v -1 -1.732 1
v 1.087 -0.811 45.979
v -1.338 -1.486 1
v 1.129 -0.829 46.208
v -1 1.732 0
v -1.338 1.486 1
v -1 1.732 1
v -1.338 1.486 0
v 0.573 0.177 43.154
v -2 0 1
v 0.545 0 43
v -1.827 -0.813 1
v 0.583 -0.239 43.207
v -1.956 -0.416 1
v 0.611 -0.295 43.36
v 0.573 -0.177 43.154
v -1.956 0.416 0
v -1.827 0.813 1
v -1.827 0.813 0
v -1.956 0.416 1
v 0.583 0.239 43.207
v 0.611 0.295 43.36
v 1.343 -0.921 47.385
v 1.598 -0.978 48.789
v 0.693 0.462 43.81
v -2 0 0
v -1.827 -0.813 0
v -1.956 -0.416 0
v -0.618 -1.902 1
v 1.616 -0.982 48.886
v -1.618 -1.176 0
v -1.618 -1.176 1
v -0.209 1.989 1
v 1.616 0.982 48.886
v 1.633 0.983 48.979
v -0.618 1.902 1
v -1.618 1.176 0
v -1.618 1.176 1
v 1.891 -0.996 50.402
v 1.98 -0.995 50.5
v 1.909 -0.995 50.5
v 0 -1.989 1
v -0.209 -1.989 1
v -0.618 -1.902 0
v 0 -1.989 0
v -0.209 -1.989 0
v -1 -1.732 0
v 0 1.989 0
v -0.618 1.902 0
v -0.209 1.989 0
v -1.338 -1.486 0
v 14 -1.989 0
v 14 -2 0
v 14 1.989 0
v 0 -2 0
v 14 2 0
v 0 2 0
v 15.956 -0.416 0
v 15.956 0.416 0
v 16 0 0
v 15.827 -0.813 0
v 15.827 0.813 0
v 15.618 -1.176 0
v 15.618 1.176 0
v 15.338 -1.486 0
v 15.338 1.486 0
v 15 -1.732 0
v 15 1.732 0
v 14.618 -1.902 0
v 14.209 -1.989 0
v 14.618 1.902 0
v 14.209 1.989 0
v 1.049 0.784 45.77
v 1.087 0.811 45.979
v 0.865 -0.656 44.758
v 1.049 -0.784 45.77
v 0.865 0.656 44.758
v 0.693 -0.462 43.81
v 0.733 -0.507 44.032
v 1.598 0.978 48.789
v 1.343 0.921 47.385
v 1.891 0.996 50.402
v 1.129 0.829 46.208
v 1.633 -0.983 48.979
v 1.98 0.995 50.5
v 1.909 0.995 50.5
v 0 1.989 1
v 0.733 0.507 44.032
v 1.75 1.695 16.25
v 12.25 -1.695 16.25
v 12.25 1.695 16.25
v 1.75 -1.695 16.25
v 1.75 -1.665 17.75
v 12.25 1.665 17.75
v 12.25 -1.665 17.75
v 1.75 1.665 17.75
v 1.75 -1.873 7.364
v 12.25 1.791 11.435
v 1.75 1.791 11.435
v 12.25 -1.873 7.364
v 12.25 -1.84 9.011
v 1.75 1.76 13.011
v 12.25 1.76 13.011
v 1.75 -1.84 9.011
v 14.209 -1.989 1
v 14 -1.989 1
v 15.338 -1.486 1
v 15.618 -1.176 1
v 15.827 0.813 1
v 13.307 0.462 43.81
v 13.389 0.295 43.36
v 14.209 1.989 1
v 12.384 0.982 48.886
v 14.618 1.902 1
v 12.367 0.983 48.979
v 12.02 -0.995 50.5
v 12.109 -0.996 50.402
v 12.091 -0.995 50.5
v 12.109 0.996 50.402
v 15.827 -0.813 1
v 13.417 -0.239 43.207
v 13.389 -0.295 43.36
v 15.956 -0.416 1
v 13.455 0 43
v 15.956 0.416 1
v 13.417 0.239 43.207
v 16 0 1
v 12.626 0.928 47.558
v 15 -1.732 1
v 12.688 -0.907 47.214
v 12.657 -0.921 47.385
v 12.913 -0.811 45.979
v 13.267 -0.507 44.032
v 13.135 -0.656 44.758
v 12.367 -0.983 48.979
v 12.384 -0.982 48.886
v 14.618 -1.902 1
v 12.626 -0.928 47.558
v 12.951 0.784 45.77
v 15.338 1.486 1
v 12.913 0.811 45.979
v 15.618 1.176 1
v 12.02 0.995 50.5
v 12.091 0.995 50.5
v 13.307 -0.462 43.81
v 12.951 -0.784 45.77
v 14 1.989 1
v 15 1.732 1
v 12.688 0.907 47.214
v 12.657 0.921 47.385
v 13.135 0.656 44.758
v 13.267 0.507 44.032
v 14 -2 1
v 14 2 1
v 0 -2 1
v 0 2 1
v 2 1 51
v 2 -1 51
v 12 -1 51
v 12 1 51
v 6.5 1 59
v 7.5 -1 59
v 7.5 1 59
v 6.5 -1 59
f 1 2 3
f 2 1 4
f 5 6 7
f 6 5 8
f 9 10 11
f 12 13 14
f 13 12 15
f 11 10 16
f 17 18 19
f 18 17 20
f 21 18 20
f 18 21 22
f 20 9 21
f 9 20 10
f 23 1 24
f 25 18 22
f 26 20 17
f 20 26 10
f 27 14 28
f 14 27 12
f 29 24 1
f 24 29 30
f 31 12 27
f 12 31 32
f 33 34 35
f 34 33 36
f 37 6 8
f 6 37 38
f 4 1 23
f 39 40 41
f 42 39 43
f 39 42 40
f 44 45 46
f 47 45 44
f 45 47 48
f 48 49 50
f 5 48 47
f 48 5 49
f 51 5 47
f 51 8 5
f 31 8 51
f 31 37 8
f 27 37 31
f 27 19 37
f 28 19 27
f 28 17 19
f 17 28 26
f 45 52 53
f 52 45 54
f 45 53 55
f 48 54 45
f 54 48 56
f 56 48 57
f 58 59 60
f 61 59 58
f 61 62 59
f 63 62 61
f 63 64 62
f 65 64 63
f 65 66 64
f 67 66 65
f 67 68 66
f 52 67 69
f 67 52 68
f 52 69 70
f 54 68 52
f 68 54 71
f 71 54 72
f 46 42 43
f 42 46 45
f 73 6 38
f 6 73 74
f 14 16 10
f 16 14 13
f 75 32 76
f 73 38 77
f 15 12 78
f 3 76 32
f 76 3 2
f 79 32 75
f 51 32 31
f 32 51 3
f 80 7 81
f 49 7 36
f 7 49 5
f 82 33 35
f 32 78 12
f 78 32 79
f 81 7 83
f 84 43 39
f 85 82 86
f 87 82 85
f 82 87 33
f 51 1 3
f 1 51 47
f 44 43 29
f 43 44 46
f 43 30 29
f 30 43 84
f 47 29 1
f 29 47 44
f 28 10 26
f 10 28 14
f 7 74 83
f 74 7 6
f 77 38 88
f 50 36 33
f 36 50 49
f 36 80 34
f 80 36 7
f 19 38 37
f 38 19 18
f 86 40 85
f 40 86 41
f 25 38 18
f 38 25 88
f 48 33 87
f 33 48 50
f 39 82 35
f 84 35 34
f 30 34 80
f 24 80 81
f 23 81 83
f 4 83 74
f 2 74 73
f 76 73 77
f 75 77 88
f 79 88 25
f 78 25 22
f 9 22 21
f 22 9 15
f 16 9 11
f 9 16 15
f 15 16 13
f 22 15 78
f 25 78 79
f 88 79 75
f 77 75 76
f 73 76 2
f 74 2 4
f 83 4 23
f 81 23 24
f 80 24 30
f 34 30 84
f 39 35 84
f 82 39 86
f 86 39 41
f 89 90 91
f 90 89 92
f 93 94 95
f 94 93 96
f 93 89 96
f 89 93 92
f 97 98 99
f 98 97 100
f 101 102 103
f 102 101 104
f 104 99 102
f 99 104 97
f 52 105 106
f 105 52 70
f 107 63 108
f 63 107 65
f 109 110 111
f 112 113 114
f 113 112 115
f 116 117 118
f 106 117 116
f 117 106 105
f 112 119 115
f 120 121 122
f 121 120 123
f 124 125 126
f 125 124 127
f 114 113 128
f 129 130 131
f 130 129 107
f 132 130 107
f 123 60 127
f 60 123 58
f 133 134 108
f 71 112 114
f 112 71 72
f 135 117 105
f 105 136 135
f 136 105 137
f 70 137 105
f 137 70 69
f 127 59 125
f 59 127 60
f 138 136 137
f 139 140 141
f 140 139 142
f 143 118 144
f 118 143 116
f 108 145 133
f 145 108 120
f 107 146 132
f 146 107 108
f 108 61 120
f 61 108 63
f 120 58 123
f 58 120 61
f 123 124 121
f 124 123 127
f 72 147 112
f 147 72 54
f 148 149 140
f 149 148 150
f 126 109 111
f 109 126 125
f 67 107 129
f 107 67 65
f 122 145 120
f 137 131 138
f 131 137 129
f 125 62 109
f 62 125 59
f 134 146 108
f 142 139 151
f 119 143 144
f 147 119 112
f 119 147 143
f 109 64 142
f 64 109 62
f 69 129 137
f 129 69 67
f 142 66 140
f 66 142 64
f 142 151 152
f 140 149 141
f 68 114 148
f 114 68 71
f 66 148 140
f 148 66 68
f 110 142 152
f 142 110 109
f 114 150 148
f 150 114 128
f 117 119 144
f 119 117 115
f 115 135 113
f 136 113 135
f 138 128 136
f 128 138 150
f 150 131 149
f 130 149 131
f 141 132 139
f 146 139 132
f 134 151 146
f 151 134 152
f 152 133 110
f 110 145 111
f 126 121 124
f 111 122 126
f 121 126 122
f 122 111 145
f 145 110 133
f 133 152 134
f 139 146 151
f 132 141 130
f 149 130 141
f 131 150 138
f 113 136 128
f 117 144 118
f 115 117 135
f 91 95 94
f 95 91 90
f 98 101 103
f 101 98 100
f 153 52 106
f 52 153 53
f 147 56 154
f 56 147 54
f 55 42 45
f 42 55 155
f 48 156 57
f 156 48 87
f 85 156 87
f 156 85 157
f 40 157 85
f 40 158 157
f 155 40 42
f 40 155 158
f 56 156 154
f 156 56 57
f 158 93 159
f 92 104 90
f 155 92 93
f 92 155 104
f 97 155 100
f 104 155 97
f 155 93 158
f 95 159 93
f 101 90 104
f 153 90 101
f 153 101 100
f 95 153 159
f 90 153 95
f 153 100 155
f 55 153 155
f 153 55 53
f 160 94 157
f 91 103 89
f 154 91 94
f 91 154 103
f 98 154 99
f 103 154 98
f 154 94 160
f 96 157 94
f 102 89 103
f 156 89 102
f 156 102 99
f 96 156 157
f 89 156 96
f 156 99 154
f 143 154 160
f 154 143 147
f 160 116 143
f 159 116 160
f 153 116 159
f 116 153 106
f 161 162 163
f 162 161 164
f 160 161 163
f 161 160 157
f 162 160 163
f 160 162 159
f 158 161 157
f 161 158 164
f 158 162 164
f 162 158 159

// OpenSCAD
// band width[mm]
nauhanleveys = 10; // [1:1:50]
// band thickness[mm] 
nauhanpaksuus = 1; // [0.2:0.1:5]

module takareika(){
hull(){
translate([1.25+nauhanleveys/20,-5,4])  
cube([nauhanleveys+0.5,0.1,nauhanpaksuus+0.5,]);
translate([1.25+nauhanleveys/20,4,14])  
cube([nauhanleveys+0.5,0.1,nauhanpaksuus+0.5,]);
}}

module etureika(){
hull(){
translate([1.25+nauhanleveys/20,-5,12.75+nauhanpaksuus+nauhanleveys/4])  
cube([nauhanleveys+0.5,1,nauhanpaksuus+0.5]);
translate([1.25+nauhanleveys/20,4,12.75+nauhanpaksuus+nauhanleveys/4])  
cube([nauhanleveys+0.5,1,nauhanpaksuus+0.5]);
}}


$fn = 30;

difference(){
hull(){  // vasen reuna
translate([0,0,0.5])
cylinder(h=1, r=1.5+nauhanleveys/20, center=true);
translate([1.5+nauhanleveys/20,0,50])
cylinder(h=1, r=0.5+nauhanleveys/20, center=true);
}
// viiste
hull(){
translate([0,-5,51])
cube([1.5+nauhanleveys/20,10,1]);
translate([-10,-5,40])
cube([10,10,1]);
}
etureika();
takareika();
}

difference(){
hull(){ // oikea reuna
translate([nauhanleveys+3+nauhanleveys/10,0,0.5])
cylinder(h=1, r=1.5+nauhanleveys/20, center=true);
translate([nauhanleveys+1.5+nauhanleveys/20,0,50])
cylinder(h=1, r=0.5+nauhanleveys/20, center=true);
}
//viiste
hull(){
translate([1.5+nauhanleveys+nauhanleveys/20,-5,51])
cube([10,10,1]);
translate([3+nauhanleveys+nauhanleveys/10,-5,40])
cube([10,10,1]);
}
etureika();
takareika();
}


difference(){
hull(){ // keskipötkylä
translate([0,-1.5-nauhanleveys/20,0])
cube([nauhanleveys+3+nauhanleveys/10,3+nauhanleveys/10,1]);

translate([1.5+nauhanleveys/20,-0.5-nauhanleveys/20,50])
cube([nauhanleveys,1+nauhanleveys/10,1]);
}

etureika();
takareika();
}

// kärki:

hull(){
translate([1.5+nauhanleveys/20,-0.5-nauhanleveys/20,50])
cube([nauhanleveys,1+nauhanleveys/10,1]);

translate([1+nauhanleveys/2+nauhanleveys/20,-0.5-nauhanleveys/20,58])
cube([1,1+nauhanleveys/10,1]);
}
